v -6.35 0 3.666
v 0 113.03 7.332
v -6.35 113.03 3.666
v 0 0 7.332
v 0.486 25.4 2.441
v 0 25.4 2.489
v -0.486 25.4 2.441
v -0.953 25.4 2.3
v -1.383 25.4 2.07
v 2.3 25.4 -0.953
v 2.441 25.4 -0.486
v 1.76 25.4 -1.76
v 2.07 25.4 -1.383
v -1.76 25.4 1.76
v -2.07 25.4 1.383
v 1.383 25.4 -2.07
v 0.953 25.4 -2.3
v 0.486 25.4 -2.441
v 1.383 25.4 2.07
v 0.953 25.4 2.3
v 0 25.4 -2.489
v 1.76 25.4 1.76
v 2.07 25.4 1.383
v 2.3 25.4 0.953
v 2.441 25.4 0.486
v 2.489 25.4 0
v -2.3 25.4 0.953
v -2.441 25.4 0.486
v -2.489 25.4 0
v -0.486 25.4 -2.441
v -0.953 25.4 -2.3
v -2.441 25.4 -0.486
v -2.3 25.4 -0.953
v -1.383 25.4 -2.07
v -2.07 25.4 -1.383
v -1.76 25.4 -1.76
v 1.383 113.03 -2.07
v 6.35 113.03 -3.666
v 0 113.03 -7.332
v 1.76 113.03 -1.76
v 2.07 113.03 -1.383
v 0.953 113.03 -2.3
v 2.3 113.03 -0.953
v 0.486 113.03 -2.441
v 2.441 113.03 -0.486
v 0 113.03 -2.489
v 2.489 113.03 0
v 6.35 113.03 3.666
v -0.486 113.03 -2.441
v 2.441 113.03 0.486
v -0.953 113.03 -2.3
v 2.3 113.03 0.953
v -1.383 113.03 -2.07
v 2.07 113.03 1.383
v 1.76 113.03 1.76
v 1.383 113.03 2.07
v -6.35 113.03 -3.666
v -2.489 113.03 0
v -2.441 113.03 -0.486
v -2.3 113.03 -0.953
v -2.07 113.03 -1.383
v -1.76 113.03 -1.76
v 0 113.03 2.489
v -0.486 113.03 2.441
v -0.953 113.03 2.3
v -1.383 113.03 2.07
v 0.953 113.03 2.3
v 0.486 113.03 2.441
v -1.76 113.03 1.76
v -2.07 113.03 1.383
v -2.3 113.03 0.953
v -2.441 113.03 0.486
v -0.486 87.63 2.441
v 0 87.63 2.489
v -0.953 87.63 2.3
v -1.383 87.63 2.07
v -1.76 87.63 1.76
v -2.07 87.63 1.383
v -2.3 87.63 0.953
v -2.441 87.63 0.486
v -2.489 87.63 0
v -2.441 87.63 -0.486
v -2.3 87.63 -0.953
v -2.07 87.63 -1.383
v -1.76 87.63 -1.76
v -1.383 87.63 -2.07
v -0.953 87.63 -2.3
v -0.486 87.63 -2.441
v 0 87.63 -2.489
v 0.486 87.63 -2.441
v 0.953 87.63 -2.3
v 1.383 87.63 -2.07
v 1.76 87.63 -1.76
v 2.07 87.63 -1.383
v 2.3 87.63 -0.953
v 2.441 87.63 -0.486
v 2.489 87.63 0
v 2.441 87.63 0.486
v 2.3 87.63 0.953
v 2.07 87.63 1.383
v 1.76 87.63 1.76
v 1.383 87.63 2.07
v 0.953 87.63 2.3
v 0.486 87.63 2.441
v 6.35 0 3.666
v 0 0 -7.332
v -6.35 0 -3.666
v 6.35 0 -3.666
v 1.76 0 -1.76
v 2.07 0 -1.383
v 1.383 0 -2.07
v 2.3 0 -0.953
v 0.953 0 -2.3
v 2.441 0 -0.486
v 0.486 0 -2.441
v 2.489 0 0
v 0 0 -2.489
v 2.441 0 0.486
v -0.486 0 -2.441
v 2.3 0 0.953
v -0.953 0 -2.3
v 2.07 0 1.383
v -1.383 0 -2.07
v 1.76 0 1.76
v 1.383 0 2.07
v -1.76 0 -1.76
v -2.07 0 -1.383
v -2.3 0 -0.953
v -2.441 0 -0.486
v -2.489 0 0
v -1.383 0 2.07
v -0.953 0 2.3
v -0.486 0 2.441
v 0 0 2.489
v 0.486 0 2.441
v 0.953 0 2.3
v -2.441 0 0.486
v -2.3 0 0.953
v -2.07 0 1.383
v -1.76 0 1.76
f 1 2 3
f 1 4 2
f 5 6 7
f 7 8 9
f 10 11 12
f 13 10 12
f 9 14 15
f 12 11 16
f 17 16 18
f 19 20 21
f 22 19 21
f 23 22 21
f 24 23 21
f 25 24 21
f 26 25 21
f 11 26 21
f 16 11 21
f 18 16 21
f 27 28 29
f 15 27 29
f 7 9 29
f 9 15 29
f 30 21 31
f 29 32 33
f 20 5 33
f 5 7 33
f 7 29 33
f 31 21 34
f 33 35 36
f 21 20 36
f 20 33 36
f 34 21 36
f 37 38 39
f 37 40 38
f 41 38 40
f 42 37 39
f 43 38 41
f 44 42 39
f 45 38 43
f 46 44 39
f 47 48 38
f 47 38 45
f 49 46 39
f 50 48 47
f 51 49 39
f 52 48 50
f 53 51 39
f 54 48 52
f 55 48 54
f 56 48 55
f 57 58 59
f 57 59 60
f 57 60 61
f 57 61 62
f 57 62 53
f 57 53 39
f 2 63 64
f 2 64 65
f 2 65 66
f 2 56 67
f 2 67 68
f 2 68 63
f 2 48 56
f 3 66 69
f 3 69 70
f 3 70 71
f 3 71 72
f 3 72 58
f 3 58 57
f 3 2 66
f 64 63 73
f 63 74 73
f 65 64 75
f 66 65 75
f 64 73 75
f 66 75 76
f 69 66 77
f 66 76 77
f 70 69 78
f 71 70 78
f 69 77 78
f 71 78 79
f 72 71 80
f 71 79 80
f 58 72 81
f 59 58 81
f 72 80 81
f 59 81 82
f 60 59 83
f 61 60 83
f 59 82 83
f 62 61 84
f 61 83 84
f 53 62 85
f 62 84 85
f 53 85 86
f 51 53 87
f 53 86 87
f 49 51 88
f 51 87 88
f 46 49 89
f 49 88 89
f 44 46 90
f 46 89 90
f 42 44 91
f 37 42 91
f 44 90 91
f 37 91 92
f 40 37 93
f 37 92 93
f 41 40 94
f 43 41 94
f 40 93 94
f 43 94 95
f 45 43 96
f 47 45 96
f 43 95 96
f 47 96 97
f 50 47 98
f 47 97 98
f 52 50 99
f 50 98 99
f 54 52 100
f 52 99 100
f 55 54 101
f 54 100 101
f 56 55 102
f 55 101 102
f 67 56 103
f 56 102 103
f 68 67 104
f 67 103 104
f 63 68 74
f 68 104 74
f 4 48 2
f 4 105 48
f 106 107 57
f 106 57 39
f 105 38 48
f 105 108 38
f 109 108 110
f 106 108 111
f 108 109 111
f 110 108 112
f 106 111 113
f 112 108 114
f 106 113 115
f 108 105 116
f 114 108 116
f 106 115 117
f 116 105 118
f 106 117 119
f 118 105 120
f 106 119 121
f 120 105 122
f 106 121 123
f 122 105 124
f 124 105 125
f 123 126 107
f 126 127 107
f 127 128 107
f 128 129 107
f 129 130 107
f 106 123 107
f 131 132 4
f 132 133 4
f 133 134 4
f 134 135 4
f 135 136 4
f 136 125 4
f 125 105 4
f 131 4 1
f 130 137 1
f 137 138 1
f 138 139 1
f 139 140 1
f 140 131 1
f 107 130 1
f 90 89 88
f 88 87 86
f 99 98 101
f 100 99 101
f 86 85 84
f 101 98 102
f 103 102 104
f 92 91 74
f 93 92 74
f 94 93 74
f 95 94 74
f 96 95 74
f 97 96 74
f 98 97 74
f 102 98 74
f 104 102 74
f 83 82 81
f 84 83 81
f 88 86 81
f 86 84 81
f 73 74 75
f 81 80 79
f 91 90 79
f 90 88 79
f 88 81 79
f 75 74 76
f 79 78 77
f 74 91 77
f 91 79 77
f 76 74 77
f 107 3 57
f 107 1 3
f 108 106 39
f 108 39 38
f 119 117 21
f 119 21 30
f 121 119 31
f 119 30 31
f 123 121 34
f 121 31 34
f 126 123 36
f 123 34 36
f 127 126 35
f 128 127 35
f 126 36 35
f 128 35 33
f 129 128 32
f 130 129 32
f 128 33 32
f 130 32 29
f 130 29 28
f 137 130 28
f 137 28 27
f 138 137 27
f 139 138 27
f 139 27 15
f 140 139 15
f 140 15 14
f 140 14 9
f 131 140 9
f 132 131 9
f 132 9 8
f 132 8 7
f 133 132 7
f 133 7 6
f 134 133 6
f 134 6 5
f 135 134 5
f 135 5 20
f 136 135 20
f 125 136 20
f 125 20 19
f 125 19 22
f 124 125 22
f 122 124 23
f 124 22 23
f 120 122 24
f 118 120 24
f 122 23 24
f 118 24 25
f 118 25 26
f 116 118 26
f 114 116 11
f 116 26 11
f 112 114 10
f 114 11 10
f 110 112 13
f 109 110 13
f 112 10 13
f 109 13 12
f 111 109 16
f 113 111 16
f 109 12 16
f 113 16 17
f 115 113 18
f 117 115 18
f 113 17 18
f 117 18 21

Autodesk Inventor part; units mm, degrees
ref_plane "YZ Plane" through (0, 0, 0) normal (1, 0, 0) x (0, 1, 0)
ref_plane "XZ Plane" through (0, 0, 0) normal (0, 1, 0) x (-1, 0, 0)
ref_plane "XY Plane" through (0, 0, 0) normal (0, 0, 1) x (1, 0, 0)
sketch "Sketch1" plane through (0, 0, 0) normal (0, 1, 0) x (-1, 0, 0)
  line L0 (6.35, -3.6662) -> (0, -7.3323)
  line L1 (0, -7.3323) -> (-6.35, -3.6662)
  line L2 (-6.35, -3.6662) -> (-6.35, 3.6662)
  line L3 (-6.35, 3.6662) -> (0, 7.3323)
  line L4 (0, 7.3323) -> (6.35, 3.6662)
  line L5 (6.35, 3.6662) -> (6.35, -3.6662)
  point P0 (0, 0)
  point P1 (0, 0)
  point P2 (0, 0)
  dimension "d0" = 12.7
extrude "Extrusion1" add sketch "Sketch1" along normal blind 113.03
sketch "Sketch2" plane through (0, 113.03, 0) normal (0, 1, 0) x (1, 0, 0)
  point P0 (0, 0)
  point P1 (0, 0)
hole "Hole1" at (0, 113.03, 0) direction (0, -1, 0) diameter 4.9784 depth 25.4 thread size "1/4-20 UNC" class "2B" standard "ANSI Unified Screw Threads"
sketch "Sketch3" plane through (0, 0, 0) normal (0, -1, 0) x (1, 0, 0)
  point P0 (0, 0)
  point P1 (0, 0)
hole "Hole2" at (0, 0, 0) direction (0, 1, 0) diameter 4.9784 depth 25.4 thread size "1/4-20 UNC" class "2B" standard "ANSI Unified Screw Threads"
properties part number "ELEV_041_HEXSHAFT4" material "Aluminum 6061"
